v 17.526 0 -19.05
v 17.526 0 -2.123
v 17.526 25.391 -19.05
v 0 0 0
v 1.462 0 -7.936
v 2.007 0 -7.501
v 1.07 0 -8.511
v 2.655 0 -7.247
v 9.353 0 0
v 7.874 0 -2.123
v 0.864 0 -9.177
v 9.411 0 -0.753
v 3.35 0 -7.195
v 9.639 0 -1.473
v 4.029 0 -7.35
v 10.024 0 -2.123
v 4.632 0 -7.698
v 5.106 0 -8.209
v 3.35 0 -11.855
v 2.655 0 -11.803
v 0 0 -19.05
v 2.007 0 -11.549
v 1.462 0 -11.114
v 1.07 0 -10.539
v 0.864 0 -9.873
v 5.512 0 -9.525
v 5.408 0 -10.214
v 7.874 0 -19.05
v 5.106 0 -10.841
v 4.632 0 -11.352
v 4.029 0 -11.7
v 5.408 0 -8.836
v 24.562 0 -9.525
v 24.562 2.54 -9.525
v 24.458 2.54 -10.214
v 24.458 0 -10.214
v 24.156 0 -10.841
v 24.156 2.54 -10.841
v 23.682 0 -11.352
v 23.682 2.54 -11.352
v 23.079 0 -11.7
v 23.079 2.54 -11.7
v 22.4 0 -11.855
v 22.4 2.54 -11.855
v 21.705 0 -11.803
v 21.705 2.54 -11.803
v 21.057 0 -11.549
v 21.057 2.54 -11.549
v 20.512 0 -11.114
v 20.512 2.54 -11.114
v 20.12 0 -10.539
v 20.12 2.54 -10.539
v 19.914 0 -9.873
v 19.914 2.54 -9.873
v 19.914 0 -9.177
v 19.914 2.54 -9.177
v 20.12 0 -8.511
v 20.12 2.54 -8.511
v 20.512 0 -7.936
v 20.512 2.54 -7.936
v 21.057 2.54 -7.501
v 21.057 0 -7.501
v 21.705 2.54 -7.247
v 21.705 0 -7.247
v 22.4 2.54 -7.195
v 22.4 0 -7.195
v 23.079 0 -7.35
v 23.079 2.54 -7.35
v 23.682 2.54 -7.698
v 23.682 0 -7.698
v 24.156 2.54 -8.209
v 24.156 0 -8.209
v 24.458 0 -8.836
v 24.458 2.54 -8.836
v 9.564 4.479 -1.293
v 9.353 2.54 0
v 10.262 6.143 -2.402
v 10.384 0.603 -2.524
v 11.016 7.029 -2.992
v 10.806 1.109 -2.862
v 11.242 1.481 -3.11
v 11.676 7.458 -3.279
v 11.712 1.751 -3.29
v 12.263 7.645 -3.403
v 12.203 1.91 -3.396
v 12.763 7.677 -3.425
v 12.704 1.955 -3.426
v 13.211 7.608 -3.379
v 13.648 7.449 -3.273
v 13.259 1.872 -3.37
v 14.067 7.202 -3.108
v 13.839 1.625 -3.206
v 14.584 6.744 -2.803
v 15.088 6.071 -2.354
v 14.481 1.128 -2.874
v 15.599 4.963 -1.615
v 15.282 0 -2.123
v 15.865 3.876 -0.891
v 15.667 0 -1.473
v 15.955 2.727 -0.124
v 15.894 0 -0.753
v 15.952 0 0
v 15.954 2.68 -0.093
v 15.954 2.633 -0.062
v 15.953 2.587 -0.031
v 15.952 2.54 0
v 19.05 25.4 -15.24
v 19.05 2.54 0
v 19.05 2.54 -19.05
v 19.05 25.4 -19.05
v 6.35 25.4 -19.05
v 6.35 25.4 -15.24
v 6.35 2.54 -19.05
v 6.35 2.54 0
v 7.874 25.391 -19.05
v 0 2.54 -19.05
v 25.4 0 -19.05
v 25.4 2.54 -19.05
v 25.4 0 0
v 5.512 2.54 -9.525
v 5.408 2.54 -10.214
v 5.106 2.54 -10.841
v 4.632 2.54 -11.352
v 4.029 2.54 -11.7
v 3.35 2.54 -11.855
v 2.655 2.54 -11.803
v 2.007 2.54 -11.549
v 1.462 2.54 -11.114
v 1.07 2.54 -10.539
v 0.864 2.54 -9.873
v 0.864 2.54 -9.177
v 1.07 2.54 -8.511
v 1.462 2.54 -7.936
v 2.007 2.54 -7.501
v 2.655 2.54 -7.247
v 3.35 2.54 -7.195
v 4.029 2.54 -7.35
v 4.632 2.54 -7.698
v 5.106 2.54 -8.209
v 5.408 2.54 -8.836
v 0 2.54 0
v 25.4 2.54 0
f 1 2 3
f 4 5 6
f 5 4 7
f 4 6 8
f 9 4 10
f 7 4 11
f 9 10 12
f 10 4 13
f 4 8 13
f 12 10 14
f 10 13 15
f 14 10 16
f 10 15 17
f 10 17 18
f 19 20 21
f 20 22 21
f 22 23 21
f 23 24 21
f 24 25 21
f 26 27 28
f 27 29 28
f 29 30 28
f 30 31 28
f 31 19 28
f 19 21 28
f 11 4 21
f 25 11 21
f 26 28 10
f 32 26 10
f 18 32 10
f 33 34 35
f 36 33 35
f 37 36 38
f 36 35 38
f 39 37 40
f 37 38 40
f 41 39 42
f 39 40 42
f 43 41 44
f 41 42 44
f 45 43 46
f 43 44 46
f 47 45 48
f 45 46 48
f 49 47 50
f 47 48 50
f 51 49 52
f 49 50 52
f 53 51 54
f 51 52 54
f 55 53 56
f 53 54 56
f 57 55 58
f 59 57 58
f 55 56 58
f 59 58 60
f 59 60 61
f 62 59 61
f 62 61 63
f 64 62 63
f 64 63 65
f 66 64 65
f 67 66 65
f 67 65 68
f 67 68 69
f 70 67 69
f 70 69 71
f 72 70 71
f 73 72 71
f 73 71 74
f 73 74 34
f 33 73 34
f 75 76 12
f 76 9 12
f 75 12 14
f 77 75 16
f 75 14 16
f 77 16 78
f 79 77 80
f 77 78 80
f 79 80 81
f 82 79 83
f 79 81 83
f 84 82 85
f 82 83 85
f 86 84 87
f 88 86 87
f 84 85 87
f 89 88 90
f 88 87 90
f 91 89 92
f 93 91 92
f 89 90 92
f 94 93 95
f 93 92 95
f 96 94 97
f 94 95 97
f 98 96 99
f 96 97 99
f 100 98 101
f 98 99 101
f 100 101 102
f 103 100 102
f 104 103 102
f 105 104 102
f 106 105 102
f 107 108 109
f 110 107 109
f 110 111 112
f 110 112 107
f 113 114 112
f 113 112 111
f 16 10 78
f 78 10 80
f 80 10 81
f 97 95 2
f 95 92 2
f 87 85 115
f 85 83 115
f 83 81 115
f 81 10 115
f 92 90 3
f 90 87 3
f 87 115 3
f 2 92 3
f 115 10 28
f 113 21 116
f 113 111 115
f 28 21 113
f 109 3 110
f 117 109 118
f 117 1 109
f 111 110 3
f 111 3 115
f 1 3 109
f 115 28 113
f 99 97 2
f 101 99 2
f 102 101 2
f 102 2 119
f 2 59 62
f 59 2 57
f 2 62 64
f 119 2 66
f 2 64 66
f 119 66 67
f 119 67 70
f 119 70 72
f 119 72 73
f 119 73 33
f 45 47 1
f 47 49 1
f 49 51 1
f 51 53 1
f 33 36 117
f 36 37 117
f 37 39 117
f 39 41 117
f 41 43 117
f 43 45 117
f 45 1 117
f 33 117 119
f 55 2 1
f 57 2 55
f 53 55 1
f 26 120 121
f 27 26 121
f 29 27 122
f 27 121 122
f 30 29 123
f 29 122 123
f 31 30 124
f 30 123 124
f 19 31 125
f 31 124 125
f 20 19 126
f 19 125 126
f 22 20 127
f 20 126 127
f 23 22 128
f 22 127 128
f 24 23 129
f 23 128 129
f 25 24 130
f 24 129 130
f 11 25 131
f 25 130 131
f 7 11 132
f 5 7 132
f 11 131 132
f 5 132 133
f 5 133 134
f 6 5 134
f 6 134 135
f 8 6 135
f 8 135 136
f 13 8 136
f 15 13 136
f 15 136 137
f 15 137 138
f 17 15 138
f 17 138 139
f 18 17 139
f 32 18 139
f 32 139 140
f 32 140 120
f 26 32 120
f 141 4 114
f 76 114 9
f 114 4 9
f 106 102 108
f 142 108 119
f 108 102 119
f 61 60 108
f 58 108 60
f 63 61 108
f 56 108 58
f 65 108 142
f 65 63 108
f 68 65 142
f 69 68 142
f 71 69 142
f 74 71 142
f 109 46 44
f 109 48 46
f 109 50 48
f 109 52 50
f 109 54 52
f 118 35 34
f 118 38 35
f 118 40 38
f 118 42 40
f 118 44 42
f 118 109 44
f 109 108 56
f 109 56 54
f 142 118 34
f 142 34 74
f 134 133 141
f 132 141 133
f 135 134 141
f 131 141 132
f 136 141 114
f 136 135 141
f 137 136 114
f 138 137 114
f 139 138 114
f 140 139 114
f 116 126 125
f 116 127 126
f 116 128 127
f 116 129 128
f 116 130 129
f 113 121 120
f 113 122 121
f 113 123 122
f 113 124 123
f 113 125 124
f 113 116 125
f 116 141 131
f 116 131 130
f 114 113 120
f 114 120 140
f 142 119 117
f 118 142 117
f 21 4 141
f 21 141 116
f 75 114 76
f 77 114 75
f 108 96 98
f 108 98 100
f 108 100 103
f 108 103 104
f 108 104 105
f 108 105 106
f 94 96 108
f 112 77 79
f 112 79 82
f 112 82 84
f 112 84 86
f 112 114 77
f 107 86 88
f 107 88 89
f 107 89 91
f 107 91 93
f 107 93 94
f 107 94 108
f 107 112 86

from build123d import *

# Parameters (mm, degrees)
SKETCH1_W           = 25.4
SKETCH1_H           = 19.05
BOSS_EXTRUDE1_DEPTH = 25.4
CHAMFER1_SIZE       = 22.86
CHAMFER1_SIZE2      = 15.24
SKETCH2_W           = 6.35
SKETCH2_H           = 22.78915262
CUT_EXTRUDE1_DEPTH  = 22.86
SKETCH3_W           = 9.652
SKETCH3_H           = 39.353766532
CUT_EXTRUDE2_DEPTH  = 22.86
SKETCH4_R           = 2.3368
CUT_EXTRUDE3_DEPTH  = 22.86
SKETCH6_R           = 3.302
CUT_EXTRUDE5_DEPTH  = 26.4


with BuildPart() as part:
    # Sketch1 → Boss-Extrude1 (new body)
    with BuildSketch(Plane(origin=(0, 0, 0), x_dir=(1, 0, 0), z_dir=(0, 1, 0))):
        with Locations((12.7, 9.525)):
            Rectangle(SKETCH1_W, SKETCH1_H)
    extrude(amount=BOSS_EXTRUDE1_DEPTH)

    # Chamfer1
    chamfer1_edges = [part.edges().sort_by_distance(p)[0] for p in [
        (12.7, 25.4, 0),
    ]]
    chamfer1_side = [part.faces().sort_by_distance(p)[0] for p in [
        (12.7, 12.7, 0),
    ]]
    chamfer(chamfer1_edges, length=CHAMFER1_SIZE, length2=CHAMFER1_SIZE2, reference=chamfer1_side[0])

    # Sketch2 → Cut-Extrude1 (cut)
    with BuildSketch(Plane(origin=(0, 25.4, 0), x_dir=(1, 0, 0), z_dir=(0, 1, 0))):
        with Locations((22.225, 7.65542369)):
            Rectangle(SKETCH2_W, SKETCH2_H)
        with Locations((3.175, 7.65542369)):
            Rectangle(SKETCH2_W, SKETCH2_H)
    extrude(amount=-CUT_EXTRUDE1_DEPTH, mode=Mode.SUBTRACT)

    # Sketch3 → Cut-Extrude2 (cut)
    with BuildSketch(Plane(origin=(0, -0.979634661, -1.469451992), x_dir=(1, 0, 0), z_dir=(0, 0.554700196, 0.832050294))):
        with Locations((12.7, 14.647750361)):
            Rectangle(SKETCH3_W, SKETCH3_H)
    extrude(amount=-CUT_EXTRUDE2_DEPTH, mode=Mode.SUBTRACT)

    # Sketch4 → Cut-Extrude3 (cut)
    with BuildSketch(Plane(origin=(0, 2.54, 0), x_dir=(1, 0, 0), z_dir=(0, 1, 0))):
        with Locations((3.175, 9.525)):
            Circle(SKETCH4_R)
        with Locations((22.225, 9.525)):
            Circle(SKETCH4_R)
    extrude(amount=-CUT_EXTRUDE3_DEPTH, mode=Mode.SUBTRACT)

    # Sketch6 → Cut-Extrude5 (cut, through all)
    with BuildSketch(Plane.XZ):
        with Locations((12.652625, -0.124494929)):
            Circle(SKETCH6_R)
    extrude(amount=-CUT_EXTRUDE5_DEPTH, mode=Mode.SUBTRACT)


solid = part.part
